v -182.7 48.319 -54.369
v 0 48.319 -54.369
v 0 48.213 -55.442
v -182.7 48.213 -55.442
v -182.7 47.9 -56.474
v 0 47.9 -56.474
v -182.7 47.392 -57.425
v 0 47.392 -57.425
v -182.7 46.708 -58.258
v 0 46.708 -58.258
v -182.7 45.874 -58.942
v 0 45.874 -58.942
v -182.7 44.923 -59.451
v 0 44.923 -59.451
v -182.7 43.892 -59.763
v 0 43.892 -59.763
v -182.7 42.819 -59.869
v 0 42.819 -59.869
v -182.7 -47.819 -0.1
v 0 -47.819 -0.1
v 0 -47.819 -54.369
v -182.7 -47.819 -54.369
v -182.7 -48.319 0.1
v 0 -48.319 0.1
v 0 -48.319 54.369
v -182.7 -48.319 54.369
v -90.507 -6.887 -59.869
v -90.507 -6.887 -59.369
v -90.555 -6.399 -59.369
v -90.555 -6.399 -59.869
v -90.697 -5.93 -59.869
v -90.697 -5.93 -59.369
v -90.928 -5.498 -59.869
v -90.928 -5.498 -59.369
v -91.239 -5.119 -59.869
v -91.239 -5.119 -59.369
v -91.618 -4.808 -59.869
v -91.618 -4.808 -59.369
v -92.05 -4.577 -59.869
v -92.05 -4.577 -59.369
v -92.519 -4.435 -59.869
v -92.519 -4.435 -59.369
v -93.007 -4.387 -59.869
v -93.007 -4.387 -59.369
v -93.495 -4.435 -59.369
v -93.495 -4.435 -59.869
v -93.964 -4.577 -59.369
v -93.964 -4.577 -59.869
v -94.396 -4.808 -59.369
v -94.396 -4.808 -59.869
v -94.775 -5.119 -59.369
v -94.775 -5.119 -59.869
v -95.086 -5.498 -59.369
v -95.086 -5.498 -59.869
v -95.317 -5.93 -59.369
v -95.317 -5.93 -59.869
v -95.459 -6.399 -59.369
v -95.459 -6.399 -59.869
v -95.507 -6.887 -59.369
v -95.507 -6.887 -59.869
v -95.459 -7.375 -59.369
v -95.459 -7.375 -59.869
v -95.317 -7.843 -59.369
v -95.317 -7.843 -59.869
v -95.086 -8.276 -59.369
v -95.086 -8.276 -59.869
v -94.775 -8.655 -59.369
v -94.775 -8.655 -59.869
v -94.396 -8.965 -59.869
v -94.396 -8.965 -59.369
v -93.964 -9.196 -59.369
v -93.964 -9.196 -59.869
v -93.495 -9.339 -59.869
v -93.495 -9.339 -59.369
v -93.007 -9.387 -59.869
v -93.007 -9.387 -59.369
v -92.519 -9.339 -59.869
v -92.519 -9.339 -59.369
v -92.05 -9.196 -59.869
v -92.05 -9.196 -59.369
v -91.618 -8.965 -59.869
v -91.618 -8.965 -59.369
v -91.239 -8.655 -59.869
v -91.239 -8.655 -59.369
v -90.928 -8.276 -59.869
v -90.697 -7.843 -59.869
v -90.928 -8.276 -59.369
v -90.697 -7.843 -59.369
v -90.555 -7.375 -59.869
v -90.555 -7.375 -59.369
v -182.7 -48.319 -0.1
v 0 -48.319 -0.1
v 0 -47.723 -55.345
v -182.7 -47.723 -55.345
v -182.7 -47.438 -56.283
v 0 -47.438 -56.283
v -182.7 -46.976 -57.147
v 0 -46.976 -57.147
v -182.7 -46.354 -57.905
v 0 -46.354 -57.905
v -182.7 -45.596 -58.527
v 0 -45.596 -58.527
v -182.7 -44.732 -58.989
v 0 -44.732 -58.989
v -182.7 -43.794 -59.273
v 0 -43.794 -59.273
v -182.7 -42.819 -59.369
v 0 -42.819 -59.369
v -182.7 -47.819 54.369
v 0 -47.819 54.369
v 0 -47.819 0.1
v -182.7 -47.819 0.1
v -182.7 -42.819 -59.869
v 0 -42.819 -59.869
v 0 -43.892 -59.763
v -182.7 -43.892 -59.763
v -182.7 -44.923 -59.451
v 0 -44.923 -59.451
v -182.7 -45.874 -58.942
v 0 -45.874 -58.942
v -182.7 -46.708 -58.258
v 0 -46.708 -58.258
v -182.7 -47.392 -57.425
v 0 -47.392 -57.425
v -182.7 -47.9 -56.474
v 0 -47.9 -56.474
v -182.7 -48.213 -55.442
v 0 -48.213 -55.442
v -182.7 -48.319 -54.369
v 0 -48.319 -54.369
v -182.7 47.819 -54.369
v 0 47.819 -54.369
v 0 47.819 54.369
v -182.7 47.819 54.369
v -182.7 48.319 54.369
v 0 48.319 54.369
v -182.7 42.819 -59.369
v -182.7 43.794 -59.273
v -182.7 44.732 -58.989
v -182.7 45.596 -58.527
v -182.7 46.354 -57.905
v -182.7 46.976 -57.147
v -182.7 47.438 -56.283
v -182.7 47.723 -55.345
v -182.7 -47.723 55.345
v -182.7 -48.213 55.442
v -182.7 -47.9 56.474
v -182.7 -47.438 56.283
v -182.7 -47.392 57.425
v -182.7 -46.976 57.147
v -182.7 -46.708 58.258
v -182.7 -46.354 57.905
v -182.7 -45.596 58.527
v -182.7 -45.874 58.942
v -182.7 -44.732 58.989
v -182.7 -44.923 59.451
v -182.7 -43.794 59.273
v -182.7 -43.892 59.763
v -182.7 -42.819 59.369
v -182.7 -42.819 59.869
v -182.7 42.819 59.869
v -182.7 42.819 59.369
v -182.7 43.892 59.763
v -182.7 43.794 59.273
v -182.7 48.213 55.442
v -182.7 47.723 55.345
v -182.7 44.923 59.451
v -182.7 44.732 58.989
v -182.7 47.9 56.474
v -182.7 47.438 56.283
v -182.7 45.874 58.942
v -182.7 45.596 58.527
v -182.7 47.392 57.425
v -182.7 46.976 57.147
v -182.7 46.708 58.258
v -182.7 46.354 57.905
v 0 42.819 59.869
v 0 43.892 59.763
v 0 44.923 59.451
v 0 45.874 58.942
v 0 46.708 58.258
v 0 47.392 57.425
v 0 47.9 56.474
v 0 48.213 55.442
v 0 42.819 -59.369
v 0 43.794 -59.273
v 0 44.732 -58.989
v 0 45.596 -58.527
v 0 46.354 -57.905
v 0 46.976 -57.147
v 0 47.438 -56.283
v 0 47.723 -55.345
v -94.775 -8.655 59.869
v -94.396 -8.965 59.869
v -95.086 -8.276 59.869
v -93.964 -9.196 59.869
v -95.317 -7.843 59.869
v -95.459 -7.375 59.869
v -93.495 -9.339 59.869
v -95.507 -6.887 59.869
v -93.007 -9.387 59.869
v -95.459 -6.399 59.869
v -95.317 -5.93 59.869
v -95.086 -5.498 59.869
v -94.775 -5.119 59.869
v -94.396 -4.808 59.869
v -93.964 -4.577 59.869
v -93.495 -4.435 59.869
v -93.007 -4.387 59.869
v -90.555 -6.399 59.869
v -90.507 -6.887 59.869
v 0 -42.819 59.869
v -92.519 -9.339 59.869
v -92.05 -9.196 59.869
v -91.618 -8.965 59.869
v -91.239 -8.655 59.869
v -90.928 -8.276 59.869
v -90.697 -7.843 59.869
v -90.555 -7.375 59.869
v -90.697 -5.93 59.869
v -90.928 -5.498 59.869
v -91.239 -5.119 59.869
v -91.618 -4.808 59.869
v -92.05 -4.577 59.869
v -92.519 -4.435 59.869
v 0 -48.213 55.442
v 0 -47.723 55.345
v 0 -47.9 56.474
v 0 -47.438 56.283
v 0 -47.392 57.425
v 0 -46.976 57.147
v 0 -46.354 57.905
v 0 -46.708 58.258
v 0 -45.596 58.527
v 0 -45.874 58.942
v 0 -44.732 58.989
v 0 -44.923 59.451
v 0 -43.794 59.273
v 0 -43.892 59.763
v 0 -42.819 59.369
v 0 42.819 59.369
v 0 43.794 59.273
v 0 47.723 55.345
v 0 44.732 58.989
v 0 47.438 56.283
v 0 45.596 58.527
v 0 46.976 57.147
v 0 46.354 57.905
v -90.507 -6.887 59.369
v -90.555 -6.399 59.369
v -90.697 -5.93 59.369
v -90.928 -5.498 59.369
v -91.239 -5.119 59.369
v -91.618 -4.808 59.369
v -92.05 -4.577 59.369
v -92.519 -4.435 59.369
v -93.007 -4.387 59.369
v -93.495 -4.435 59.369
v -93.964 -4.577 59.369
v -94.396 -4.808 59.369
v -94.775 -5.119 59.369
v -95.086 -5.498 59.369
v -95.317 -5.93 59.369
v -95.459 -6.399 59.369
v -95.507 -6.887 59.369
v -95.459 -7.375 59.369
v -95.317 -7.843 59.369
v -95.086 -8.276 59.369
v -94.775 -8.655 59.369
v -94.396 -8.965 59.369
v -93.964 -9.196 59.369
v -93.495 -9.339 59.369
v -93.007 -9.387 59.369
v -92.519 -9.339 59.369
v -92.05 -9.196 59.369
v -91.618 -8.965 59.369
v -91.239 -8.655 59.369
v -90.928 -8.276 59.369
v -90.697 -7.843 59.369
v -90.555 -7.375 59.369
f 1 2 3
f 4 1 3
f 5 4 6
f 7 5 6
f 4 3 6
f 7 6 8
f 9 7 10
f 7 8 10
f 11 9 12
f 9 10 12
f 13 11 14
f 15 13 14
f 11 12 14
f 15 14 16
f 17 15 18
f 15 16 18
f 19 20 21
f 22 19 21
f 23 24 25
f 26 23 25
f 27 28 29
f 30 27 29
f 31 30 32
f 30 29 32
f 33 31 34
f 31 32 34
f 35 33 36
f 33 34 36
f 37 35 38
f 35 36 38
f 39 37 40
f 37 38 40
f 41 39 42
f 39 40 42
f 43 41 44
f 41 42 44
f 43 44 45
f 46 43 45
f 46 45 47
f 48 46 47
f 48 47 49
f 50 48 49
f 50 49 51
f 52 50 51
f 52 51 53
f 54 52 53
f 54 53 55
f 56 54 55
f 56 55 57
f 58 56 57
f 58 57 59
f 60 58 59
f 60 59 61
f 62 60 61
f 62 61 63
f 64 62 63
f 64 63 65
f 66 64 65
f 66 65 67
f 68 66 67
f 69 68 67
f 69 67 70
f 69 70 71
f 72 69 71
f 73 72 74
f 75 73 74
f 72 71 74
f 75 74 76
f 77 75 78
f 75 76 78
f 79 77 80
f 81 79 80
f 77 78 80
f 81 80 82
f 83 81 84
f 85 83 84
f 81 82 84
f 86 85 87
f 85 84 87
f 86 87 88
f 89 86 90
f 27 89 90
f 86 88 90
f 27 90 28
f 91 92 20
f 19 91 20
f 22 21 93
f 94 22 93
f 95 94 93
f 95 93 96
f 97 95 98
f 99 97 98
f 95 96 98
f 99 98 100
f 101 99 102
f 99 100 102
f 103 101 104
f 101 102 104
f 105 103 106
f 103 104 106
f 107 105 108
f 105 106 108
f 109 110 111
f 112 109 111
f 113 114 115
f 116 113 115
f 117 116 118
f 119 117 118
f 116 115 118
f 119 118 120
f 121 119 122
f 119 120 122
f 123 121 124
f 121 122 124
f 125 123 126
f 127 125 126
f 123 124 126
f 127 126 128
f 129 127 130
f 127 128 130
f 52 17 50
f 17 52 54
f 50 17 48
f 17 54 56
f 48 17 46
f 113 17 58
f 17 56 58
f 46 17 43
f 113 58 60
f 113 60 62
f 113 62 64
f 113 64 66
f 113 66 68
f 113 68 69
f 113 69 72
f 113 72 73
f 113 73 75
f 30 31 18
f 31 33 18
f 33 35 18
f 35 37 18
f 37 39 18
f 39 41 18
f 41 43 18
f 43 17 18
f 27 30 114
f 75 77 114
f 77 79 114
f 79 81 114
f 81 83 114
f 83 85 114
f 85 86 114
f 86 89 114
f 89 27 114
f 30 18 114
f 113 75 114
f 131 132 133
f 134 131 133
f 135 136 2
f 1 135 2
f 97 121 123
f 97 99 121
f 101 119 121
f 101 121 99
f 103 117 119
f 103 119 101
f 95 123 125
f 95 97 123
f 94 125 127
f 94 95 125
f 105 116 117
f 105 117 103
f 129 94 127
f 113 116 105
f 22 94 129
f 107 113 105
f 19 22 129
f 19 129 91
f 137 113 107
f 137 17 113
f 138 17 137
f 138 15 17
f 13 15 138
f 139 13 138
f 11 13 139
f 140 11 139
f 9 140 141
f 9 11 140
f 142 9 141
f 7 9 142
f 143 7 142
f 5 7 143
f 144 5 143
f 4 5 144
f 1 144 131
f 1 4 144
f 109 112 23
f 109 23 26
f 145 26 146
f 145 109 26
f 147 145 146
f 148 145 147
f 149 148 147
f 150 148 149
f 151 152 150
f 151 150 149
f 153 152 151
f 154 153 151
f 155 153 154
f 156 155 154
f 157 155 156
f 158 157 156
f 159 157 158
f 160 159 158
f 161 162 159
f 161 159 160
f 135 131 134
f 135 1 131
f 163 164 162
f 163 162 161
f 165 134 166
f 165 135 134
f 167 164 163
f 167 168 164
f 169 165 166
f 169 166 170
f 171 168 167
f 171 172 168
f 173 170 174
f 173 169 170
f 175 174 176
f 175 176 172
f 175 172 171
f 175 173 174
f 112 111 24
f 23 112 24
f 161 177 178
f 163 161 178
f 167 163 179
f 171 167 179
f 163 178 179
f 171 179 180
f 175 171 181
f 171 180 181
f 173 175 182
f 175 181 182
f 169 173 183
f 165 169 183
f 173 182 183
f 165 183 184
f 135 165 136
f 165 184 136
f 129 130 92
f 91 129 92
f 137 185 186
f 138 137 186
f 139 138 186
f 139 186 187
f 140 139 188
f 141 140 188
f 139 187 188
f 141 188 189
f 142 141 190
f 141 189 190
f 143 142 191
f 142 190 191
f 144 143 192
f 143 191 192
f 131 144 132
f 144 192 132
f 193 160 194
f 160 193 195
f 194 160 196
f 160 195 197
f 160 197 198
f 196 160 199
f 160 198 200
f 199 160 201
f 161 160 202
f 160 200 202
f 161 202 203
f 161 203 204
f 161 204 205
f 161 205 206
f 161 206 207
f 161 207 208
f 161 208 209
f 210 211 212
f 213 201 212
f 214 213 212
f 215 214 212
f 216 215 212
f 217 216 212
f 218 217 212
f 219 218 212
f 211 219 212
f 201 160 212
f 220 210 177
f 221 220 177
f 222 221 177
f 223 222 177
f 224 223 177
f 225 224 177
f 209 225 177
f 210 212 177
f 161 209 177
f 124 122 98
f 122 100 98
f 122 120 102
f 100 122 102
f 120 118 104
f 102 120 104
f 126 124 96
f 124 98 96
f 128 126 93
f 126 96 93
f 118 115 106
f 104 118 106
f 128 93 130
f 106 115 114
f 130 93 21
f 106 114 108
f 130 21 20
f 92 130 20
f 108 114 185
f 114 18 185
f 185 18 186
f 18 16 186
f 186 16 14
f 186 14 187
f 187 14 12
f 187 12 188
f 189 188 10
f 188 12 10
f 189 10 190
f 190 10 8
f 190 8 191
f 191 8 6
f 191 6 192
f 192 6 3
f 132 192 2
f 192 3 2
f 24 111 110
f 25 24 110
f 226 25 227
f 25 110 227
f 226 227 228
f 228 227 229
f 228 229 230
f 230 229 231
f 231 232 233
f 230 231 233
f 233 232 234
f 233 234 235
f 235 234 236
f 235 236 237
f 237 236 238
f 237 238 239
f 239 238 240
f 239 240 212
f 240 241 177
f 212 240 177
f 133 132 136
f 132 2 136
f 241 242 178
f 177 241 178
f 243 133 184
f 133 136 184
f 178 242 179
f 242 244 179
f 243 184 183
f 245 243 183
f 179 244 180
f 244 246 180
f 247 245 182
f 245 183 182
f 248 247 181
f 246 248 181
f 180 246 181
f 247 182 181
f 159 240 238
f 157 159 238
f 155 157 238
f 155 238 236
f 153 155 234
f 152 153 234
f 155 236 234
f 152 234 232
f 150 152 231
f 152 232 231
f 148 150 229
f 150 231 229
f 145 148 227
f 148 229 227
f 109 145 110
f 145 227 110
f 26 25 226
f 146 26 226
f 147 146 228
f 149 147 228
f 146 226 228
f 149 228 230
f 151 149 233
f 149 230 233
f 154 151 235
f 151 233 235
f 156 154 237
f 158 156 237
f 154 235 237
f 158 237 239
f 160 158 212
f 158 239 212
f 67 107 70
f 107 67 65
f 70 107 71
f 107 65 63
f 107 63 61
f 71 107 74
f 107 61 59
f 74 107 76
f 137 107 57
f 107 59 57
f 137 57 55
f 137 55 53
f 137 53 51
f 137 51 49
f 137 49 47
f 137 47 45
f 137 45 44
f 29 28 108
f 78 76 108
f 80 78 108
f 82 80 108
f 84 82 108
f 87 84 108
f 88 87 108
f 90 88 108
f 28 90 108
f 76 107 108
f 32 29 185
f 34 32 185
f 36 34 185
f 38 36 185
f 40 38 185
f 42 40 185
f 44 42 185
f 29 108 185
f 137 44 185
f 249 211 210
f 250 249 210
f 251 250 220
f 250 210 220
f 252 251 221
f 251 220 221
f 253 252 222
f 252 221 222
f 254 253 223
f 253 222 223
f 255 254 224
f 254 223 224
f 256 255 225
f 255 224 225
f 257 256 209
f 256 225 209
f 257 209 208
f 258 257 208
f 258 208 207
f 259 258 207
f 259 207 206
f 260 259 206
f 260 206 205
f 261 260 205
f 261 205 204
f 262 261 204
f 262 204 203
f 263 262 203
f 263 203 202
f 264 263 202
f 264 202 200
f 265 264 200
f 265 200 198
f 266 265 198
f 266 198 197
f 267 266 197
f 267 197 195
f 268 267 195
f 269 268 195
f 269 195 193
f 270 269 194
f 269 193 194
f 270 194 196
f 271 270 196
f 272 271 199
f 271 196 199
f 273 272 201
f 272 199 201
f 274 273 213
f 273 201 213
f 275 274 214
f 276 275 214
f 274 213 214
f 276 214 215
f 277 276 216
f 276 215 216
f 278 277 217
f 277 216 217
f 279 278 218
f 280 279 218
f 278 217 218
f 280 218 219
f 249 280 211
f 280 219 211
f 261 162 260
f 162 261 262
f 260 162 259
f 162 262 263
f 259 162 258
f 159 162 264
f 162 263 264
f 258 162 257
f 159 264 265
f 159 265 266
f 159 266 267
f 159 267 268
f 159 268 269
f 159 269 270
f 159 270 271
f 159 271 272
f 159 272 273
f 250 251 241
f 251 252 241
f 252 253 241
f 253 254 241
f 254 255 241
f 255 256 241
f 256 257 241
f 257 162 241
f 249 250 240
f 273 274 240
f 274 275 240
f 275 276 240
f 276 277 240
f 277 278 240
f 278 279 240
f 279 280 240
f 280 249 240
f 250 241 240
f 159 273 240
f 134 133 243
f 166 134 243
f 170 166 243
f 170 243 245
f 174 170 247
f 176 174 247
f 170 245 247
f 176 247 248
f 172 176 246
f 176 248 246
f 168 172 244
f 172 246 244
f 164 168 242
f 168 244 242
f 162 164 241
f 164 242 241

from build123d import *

# Parameters (mm, degrees)
EXTRUDE_THIN1_DEPTH = 182.7
SKETCH2_R           = 2.5
CUT_EXTRUDE1_DEPTH  = 120.738328299


with BuildPart() as part:
    # Sketch1 → Extrude-Thin1 (new body)
    with BuildSketch(Plane(origin=(0, 0, 0), x_dir=(0, 0, -1), z_dir=(1, 0, 0))):
        with BuildLine():
            Line((0.1, -47.818646587), (54.36916415, -47.818646587))
            ThreePointArc((54.36916415, -47.818646587), (57.904698056, -46.354180493), (59.36916415, -42.818646587))
            Line((59.36916415, -42.818646587), (59.36916415, 42.818646587))
            ThreePointArc((59.36916415, 42.818646587), (57.904698056, 46.354180493), (54.36916415, 47.818646587))
            Line((54.36916415, 47.818646587), (-54.36916415, 47.818646587))
            ThreePointArc((-54.36916415, 47.818646587), (-57.904698056, 46.354180493), (-59.36916415, 42.818646587))
            Line((-59.36916415, 42.818646587), (-59.36916415, -42.818646587))
            ThreePointArc((-59.36916415, -42.818646587), (-57.904698056, -46.354180493), (-54.36916415, -47.818646587))
            Line((-54.36916415, -47.818646587), (-0.1, -47.818646587))
            Line((-0.1, -47.818646587), (-0.1, -48.318646587))
            Line((-0.1, -48.318646587), (-54.36916415, -48.318646587))
            ThreePointArc((-54.36916415, -48.318646587), (-58.258251446, -46.707733884), (-59.86916415, -42.818646587))
            Line((-59.86916415, -42.818646587), (-59.86916415, 42.818646587))
            ThreePointArc((-59.86916415, 42.818646587), (-58.258251446, 46.707733884), (-54.36916415, 48.318646587))
            Line((-54.36916415, 48.318646587), (54.36916415, 48.318646587))
            ThreePointArc((54.36916415, 48.318646587), (58.258251446, 46.707733884), (59.86916415, 42.818646587))
            Line((59.86916415, 42.818646587), (59.86916415, -42.818646587))
            ThreePointArc((59.86916415, -42.818646587), (58.258251446, -46.707733884), (54.36916415, -48.318646587))
            Line((54.36916415, -48.318646587), (0.1, -48.318646587))
            Line((0.1, -48.318646587), (0.1, -47.818646587))
        make_face()
    extrude(amount=-EXTRUDE_THIN1_DEPTH)

    # Sketch2 → Cut-Extrude1 (cut, through all)
    with BuildSketch(Plane.XY.offset(59.86916415)):
        with Locations((-93.006946801, -6.886778216)):
            Circle(SKETCH2_R)
    extrude(amount=-CUT_EXTRUDE1_DEPTH, mode=Mode.SUBTRACT)


solid = part.part
